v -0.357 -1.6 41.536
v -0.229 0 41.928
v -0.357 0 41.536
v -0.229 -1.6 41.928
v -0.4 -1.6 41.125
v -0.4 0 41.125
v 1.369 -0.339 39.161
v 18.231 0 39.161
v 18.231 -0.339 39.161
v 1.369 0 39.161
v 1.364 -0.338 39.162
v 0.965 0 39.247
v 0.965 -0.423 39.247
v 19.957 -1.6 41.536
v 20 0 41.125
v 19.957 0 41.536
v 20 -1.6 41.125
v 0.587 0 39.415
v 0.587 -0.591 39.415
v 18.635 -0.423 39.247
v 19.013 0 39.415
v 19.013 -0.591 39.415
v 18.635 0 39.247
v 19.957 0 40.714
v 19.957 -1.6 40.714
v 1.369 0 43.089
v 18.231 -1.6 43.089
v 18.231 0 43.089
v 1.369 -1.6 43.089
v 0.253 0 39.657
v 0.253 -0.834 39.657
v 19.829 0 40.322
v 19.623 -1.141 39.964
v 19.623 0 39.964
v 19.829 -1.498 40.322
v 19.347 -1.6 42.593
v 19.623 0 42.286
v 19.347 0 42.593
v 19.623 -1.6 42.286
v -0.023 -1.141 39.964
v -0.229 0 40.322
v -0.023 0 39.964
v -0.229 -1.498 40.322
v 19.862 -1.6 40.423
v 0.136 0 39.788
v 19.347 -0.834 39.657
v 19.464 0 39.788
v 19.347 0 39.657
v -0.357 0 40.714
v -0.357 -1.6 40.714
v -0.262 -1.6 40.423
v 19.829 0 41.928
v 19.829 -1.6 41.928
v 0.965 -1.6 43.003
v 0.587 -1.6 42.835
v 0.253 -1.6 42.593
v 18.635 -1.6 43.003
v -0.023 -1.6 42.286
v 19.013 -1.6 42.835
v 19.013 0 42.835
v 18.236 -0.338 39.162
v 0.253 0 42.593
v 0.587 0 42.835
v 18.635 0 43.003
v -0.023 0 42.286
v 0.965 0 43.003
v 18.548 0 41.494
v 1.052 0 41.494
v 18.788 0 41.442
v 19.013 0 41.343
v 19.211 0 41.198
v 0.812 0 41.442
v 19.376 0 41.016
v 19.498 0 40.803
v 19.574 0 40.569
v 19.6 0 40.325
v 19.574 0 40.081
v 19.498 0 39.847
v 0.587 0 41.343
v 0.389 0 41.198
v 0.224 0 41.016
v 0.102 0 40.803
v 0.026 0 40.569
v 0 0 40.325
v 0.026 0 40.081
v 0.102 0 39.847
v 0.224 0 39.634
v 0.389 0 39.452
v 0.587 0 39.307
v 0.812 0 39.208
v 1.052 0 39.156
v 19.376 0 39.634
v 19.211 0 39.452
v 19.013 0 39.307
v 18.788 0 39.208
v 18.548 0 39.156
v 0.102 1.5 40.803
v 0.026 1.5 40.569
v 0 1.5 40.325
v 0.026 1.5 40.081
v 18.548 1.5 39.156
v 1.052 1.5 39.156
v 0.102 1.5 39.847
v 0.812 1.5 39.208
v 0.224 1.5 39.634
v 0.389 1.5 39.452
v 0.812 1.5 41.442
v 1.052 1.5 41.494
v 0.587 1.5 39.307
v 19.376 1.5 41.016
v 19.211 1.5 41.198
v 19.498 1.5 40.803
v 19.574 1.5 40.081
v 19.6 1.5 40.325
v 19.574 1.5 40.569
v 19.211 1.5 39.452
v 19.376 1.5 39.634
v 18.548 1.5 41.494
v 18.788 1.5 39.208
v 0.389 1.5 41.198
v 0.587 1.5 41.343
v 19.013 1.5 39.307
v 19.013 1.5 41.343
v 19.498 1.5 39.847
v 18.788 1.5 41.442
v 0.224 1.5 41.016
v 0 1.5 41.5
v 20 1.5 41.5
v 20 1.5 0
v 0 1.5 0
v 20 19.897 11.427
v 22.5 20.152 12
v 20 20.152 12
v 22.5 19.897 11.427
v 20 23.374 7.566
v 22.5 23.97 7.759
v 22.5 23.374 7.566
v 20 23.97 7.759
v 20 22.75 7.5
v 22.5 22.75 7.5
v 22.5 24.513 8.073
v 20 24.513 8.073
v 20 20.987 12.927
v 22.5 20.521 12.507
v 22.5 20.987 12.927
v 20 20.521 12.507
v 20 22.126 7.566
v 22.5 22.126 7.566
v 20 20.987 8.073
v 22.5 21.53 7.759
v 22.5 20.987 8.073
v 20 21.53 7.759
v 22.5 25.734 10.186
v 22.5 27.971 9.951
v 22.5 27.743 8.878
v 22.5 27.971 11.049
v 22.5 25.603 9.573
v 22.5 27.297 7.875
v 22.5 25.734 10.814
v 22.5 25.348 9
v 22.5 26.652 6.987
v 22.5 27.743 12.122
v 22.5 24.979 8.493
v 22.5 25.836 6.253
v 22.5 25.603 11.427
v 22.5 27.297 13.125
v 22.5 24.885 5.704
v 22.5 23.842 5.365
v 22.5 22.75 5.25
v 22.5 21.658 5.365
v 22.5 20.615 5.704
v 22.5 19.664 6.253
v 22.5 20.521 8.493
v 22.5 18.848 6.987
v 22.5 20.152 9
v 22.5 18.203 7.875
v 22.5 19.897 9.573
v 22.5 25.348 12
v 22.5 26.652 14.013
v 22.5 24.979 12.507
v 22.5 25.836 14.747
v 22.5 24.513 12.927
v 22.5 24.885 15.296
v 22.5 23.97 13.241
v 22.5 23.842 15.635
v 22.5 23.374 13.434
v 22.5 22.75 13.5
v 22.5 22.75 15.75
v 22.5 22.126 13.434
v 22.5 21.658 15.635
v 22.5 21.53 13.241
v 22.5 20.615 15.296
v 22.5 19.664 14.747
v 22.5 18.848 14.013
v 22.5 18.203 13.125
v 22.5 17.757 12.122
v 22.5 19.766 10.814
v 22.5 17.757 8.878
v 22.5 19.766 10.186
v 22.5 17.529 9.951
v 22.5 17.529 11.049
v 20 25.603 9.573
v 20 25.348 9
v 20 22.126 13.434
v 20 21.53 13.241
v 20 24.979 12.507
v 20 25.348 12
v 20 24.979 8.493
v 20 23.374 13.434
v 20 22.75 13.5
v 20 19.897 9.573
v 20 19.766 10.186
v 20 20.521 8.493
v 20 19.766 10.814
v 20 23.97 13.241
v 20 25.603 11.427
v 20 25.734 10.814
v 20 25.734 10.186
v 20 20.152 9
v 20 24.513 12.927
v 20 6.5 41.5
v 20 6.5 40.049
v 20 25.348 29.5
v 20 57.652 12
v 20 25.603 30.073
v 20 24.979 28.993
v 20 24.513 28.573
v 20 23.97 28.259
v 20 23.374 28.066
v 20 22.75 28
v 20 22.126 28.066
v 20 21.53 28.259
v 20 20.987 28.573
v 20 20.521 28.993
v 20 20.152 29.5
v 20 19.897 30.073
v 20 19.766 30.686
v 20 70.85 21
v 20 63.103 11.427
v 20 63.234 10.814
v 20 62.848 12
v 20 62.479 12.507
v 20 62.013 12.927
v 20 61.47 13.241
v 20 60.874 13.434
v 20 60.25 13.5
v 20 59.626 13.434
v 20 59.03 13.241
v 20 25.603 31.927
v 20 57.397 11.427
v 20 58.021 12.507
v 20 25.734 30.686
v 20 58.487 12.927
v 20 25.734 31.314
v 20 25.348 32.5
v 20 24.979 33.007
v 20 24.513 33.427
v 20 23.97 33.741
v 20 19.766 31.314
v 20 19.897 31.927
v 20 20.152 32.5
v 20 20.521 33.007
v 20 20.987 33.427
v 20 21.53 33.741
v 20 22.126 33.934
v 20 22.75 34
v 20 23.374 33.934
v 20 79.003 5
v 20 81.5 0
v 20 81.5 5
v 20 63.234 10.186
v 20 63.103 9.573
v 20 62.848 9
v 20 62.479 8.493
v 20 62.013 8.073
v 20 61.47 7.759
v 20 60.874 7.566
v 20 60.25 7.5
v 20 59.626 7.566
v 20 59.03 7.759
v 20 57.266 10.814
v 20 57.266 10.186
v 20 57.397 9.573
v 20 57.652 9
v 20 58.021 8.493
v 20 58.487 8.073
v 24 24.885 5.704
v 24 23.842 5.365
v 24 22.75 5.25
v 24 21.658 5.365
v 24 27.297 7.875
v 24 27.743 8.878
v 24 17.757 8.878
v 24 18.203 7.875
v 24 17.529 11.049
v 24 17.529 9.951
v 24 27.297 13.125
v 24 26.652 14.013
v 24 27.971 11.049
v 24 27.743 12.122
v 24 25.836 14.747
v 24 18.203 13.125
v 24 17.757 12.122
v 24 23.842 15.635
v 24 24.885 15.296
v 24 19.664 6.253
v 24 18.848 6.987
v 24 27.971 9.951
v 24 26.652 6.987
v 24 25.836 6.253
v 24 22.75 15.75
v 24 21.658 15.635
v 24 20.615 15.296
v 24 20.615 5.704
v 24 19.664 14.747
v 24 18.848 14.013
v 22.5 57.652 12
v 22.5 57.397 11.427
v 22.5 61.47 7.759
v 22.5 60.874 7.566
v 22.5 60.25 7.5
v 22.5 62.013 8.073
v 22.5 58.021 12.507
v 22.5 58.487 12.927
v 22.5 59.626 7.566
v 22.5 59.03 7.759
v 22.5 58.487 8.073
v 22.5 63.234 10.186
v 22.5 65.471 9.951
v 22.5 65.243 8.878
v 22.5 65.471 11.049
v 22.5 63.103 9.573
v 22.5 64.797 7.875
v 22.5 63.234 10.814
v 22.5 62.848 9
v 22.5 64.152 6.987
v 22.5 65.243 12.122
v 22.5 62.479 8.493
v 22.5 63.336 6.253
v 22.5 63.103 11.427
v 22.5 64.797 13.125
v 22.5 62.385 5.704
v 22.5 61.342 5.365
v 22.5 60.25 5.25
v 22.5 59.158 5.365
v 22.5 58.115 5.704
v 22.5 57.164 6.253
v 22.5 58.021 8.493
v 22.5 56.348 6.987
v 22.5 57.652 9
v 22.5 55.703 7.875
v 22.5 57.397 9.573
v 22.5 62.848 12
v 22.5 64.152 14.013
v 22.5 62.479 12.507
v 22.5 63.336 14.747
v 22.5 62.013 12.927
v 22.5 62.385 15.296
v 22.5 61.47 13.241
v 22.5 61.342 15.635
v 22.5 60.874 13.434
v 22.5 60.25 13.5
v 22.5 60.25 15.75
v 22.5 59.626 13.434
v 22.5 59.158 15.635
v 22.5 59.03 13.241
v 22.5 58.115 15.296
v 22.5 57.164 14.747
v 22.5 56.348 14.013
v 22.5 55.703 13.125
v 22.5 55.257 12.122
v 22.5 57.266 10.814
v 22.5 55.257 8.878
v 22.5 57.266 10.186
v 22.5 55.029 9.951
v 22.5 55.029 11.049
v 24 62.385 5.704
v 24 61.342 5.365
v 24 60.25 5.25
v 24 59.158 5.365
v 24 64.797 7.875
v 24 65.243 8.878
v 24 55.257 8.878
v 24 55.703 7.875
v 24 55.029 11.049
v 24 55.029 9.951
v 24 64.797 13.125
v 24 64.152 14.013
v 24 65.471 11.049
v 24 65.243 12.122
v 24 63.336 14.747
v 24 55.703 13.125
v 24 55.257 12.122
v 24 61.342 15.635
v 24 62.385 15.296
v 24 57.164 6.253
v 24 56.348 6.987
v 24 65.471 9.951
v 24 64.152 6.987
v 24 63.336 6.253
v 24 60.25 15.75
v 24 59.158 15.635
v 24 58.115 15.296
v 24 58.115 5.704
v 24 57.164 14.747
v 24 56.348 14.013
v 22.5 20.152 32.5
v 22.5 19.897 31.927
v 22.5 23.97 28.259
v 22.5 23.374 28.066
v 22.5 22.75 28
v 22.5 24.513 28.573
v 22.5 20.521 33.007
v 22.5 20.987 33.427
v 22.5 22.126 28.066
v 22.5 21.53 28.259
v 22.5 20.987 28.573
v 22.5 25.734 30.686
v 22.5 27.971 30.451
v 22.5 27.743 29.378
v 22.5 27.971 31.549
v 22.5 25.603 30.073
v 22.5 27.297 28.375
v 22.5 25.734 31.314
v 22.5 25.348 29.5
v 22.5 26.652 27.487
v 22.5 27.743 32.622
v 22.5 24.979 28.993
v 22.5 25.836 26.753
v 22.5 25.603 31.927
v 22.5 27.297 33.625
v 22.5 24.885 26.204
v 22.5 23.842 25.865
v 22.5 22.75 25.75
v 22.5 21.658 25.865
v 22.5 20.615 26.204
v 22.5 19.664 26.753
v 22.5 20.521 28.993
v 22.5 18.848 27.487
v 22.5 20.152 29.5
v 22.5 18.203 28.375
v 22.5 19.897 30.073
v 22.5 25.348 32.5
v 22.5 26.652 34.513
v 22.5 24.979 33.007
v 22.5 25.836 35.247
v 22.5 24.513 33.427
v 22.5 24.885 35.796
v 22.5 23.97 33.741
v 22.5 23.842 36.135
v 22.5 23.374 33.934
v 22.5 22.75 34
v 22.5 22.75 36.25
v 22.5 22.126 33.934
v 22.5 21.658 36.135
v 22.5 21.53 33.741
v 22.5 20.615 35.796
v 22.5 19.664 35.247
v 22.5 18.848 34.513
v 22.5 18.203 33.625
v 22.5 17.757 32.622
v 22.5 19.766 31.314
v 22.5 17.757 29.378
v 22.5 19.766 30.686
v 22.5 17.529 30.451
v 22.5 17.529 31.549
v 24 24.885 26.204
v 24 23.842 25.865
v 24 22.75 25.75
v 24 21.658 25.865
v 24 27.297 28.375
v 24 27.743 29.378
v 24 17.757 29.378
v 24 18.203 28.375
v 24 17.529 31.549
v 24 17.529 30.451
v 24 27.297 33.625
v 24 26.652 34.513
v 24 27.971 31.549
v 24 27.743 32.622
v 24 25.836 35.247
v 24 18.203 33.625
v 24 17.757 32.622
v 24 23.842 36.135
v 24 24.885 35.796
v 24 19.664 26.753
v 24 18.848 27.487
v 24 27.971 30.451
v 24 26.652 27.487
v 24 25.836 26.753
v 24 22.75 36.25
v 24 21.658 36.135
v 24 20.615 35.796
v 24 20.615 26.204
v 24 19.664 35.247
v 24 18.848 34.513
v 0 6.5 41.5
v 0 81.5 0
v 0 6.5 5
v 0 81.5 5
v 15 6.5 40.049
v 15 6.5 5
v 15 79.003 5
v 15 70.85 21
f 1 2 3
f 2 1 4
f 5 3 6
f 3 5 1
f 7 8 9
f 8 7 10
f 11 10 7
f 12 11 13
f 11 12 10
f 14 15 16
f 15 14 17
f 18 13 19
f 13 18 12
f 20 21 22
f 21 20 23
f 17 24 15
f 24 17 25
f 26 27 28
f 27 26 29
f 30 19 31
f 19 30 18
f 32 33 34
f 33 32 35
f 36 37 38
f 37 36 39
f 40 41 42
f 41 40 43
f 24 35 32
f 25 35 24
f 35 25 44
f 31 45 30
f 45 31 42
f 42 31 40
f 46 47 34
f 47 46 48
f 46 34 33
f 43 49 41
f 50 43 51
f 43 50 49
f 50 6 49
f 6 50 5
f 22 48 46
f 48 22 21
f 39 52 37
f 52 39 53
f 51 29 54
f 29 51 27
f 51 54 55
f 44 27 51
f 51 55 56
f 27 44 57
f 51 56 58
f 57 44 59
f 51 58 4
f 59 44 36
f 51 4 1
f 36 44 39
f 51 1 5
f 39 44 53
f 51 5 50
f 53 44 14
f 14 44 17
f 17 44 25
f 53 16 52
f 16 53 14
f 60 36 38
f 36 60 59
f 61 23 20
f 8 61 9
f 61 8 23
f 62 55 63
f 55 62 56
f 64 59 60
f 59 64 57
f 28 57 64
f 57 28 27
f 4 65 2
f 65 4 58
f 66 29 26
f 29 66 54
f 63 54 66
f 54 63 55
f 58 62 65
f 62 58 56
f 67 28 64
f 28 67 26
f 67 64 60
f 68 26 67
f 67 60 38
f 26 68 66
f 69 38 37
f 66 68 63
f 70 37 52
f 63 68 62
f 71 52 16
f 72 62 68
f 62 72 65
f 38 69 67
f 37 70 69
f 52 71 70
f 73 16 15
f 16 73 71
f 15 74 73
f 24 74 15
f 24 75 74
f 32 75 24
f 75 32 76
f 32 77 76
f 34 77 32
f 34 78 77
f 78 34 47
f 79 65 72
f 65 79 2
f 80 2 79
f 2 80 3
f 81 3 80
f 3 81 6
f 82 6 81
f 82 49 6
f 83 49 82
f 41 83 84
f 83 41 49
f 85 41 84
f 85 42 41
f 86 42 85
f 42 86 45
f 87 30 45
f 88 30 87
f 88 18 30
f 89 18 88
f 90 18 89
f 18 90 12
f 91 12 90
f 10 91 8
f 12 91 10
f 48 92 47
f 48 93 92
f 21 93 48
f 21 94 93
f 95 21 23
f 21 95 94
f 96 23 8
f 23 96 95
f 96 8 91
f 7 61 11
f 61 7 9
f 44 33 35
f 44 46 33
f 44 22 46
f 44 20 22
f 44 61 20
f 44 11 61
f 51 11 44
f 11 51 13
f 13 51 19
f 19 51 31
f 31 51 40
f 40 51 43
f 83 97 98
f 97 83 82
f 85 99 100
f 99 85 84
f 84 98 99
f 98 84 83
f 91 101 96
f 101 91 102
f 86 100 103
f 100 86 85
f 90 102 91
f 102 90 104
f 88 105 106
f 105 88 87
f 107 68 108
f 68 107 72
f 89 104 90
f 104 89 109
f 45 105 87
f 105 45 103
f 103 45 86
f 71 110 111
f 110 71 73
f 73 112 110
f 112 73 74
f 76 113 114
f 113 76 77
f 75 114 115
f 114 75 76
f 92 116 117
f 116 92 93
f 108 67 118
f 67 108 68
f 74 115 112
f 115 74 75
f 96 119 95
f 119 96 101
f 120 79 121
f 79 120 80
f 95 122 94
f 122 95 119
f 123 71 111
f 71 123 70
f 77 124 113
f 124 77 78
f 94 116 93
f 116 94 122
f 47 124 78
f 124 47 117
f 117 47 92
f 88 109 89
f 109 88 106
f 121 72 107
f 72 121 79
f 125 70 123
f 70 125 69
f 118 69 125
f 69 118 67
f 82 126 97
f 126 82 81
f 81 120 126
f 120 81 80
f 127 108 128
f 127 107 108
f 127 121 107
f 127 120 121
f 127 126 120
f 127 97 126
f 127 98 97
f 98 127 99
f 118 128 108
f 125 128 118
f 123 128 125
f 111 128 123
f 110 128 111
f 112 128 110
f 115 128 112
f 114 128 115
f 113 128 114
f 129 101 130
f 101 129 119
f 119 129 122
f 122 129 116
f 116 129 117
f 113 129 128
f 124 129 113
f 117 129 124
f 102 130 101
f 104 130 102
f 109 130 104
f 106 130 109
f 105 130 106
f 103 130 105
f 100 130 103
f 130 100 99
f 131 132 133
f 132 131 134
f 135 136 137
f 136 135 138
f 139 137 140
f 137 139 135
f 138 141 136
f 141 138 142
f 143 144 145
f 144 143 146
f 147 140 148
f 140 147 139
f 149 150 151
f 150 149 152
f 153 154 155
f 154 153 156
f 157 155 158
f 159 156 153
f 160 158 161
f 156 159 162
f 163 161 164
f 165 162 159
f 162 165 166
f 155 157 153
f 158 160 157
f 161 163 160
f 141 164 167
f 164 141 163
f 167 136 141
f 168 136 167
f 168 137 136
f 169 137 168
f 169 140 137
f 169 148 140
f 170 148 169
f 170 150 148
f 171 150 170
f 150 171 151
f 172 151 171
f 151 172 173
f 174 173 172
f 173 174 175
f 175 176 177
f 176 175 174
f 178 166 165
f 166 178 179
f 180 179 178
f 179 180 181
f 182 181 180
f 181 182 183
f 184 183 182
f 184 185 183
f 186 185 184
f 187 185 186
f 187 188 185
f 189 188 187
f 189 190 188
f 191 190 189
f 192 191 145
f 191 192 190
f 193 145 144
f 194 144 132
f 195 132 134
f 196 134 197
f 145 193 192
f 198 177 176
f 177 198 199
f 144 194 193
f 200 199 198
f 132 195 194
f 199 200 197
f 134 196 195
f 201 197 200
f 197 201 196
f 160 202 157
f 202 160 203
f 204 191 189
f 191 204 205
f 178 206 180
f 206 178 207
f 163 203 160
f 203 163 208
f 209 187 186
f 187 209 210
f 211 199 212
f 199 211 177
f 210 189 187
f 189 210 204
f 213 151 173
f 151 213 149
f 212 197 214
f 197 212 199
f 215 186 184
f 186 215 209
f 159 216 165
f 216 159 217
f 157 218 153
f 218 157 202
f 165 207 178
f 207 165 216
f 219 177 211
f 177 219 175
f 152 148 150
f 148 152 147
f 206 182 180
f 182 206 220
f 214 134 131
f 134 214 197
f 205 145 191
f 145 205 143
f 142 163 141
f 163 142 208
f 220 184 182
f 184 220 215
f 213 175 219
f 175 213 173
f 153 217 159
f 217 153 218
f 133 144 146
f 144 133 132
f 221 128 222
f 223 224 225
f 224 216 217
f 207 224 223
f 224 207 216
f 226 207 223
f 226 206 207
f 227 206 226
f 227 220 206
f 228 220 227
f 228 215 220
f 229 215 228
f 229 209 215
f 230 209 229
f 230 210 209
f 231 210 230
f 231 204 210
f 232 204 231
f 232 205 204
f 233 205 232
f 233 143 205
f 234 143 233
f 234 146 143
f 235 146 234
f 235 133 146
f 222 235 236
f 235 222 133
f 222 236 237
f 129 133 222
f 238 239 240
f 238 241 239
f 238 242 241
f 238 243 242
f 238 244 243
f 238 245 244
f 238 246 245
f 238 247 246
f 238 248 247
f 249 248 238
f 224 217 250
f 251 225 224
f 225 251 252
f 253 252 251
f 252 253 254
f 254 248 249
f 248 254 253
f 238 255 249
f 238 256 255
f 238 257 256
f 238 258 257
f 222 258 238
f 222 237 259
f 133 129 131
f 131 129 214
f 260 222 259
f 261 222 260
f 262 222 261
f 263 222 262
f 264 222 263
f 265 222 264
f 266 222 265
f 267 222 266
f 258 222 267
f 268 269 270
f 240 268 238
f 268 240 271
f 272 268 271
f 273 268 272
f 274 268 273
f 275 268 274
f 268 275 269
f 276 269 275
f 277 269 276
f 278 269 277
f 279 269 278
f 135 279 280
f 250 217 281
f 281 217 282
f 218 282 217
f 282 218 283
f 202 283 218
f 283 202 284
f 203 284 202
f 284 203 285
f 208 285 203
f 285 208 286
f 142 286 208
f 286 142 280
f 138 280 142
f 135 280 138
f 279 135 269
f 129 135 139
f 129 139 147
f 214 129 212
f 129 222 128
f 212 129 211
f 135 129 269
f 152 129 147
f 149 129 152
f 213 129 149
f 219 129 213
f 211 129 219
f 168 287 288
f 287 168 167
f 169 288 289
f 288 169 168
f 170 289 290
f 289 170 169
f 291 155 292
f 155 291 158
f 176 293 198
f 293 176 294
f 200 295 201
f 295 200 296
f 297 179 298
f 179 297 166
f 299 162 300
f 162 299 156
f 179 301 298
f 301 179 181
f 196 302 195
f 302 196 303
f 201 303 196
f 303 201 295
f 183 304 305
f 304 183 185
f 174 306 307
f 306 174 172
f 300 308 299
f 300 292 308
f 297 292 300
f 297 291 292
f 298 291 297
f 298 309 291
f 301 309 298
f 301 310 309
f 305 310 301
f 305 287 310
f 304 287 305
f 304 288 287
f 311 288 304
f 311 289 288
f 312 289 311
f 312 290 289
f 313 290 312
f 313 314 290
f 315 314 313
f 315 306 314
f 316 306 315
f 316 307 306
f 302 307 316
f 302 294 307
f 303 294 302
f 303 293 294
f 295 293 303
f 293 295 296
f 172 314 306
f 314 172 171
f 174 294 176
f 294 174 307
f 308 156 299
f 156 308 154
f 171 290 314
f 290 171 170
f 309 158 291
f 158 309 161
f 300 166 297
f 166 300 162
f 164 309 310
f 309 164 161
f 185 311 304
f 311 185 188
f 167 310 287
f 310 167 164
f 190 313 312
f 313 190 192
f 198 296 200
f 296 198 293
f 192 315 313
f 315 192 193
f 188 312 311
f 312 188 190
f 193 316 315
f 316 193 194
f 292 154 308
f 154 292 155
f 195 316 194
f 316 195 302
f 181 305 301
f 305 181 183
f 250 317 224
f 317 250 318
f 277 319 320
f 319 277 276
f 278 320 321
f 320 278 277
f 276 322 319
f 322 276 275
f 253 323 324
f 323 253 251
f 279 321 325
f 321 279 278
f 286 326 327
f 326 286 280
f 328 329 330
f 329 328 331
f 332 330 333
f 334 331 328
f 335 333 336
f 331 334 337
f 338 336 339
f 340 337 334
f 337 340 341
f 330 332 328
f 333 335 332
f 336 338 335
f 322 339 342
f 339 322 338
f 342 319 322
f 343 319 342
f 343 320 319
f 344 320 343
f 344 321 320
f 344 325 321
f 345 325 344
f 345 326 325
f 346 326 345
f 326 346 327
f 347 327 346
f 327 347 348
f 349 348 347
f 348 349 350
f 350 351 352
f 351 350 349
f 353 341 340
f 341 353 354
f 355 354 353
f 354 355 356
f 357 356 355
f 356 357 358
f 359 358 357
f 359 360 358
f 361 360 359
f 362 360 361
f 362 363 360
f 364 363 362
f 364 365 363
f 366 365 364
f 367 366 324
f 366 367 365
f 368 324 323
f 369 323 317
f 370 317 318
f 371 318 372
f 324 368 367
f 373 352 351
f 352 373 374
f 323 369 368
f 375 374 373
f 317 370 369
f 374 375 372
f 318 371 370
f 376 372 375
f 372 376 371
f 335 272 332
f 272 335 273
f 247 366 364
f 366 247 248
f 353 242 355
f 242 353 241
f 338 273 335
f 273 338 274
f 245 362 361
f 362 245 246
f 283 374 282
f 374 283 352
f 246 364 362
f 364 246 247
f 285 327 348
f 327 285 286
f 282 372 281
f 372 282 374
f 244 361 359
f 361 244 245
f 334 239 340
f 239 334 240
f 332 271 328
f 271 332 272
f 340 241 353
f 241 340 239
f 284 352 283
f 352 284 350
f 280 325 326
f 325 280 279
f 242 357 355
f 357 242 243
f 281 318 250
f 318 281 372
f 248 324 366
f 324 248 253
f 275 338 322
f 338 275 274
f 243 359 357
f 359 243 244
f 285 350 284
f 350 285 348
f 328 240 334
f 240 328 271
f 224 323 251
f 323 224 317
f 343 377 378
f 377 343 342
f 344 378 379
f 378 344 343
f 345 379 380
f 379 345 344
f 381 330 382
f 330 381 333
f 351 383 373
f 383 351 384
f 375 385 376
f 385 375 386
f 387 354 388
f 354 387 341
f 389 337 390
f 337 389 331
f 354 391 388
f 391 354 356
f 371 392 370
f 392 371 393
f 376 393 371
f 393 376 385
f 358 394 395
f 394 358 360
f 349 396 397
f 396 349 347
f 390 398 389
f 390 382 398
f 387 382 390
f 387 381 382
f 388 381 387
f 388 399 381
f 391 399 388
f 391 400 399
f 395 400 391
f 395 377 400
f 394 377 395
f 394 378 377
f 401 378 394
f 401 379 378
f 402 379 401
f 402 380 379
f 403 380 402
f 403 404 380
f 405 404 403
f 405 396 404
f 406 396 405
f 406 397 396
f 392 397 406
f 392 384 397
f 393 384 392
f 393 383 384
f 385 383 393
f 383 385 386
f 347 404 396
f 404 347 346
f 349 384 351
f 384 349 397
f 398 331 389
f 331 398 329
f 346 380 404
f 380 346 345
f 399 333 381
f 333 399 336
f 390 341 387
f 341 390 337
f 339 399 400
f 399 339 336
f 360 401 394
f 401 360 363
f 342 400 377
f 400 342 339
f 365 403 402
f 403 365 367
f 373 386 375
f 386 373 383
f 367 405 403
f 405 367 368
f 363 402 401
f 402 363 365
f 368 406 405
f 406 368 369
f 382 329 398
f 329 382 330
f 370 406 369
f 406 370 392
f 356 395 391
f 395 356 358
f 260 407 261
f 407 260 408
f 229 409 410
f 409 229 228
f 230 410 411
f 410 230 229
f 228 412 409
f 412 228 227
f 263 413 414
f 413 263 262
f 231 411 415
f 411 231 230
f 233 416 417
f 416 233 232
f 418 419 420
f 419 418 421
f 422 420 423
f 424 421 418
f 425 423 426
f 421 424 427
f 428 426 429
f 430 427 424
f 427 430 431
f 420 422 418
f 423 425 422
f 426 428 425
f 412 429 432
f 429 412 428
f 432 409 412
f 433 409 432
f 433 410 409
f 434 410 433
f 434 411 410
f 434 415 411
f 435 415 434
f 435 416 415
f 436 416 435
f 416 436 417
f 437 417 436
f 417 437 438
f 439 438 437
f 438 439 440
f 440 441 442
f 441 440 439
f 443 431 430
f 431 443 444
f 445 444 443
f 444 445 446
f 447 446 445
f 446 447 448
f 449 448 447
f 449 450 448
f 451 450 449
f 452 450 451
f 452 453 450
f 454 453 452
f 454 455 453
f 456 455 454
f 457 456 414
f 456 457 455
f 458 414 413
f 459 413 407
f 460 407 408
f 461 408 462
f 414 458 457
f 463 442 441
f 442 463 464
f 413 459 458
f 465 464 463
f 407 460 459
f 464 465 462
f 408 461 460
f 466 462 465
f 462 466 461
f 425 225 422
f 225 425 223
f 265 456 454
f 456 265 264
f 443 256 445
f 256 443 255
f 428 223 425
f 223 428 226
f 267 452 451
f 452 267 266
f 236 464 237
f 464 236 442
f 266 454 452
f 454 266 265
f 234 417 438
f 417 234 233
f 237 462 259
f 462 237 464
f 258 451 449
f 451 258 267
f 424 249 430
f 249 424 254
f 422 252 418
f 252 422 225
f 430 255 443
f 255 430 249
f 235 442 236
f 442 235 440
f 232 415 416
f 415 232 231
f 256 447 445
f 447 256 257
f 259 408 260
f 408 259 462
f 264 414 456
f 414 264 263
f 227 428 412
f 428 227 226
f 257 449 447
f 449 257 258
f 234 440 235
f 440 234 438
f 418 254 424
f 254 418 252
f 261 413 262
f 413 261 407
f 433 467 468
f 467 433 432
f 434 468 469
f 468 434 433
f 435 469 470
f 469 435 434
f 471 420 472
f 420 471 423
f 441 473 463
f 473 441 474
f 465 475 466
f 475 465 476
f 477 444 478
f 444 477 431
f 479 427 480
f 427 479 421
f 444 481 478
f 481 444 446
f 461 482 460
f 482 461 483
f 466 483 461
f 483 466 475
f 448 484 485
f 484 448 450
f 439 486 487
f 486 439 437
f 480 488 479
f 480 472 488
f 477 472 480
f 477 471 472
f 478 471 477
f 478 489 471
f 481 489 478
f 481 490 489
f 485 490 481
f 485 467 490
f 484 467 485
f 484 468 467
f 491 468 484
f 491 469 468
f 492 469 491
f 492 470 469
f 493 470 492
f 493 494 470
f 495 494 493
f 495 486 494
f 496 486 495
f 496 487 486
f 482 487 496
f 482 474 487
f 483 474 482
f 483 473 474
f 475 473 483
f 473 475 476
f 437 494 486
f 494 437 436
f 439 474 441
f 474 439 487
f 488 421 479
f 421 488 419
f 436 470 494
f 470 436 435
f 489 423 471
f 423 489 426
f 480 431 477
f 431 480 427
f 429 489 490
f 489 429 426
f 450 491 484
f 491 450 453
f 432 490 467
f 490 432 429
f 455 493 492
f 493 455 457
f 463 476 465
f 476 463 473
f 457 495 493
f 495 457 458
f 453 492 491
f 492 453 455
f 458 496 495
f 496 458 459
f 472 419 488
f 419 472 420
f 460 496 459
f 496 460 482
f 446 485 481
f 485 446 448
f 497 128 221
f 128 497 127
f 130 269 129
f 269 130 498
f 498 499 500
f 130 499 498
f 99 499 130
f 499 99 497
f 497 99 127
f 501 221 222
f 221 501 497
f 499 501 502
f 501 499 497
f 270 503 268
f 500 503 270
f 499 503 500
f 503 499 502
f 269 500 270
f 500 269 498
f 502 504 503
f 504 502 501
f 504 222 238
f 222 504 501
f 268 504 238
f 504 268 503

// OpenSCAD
// Rack Sovol Display Mount
// Single post clips into vented rack faceplate,
// Sovol display bracket mounts via keyhole slots on its left side
//
// Faceplate vertical (XZ plane) at Y=0
// Post extends into rack (+Y)
// Sovol bracket's left side faces +X, slides up (+Z) to lock onto pegs

$fn = 30;

/* [Faceplate Slots] */
slot_w = 20;
slot_h = 2.75;
panel_t = 1.5;
gap_x = 6.4;
gap_y = 3.45;
clearance = 0.2;
tab_barb = 0.4;

/* [Sovol Keyhole Mounts] */
kh_large = 11;          // large circle diameter
kh_small = 6.5;         // small circle diameter
kh_lower_gap = 37.5;    // between lower two keyholes (Y axis on post)
kh_upper_rise = 20.5;   // upper keyhole above lower pair (Z axis)
sovol_wall_t = 2;       // sovol bracket side wall thickness

/* [Mount Parameters] */
wall = 5;
post_depth = 80;        // post extends this far into rack (Y)
post_width = 20;        // post width (X), matches tab_w

/* [Derived] */
tab_w = slot_w - clearance * 2;
tab_h = slot_h - clearance * 2;

peg_shaft_d = kh_small - 0.5;
peg_head_d = kh_large - 0.5;
peg_head_t = 1.5;
peg_shaft_l = sovol_wall_t + 0.5;

// Post height: enough to cover keyhole pattern + walls
post_height = kh_upper_rise + kh_large / 2 + wall * 2;

// Keyhole peg Y positions on post (lower pair + upper)
kh_y_start = (post_depth - kh_lower_gap) / 2;

module pill_2d(w, h) {
    r = h / 2;
    hull() {
        translate([r, r]) circle(r=r);
        translate([w - r, r]) circle(r=r);
    }
}

// Tab (same as rack-display-mount.scad)
module tab() {
    difference() {
        translate([-(tab_barb), -1.6, (tab_barb * 4)])
            rotate([-90, 0, 0])
                linear_extrude(1.6)
                    pill_2d(tab_w + tab_barb * 2, tab_h + tab_barb * 4);
        translate([-(tab_w / 2), -2, -4])
            rotate([45, 0, 0])
                cube([tab_w * 2, tab_h, 2]);
    }
    rotate([-90, 0, 0])
        linear_extrude(panel_t)
            pill_2d(tab_w, tab_h);
}

// Keyhole peg: shaft through bracket wall, head at tip retains bracket
module keyhole_peg() {
    // Shaft (goes through sovol bracket wall)
    cylinder(d=peg_shaft_d, h=peg_shaft_l);
    // Head at tip (catches outside of bracket wall)
    translate([0, 0, peg_shaft_l])
        cylinder(d=peg_head_d, h=peg_head_t);
}

module post() {
    // --- Spine against faceplate ---
    peg_margin_spine = kh_large / 2 + 5;
    spine_height = kh_large / 2 + wall + kh_upper_rise + peg_margin_spine;
    translate([0, panel_t, 0])
        cube([post_width, wall, spine_height]);

    // --- Tab into faceplate slot ---
    translate([0, 0, spine_height])
        tab();

    // --- Horizontal post into rack ---
    translate([0, panel_t, 0])
        cube([post_width, post_depth, wall]);

    // --- Angled side wall (+X face) follows peg line ---
    peg_margin = kh_large / 2 + 5;
    upper_z = kh_large / 2 + wall + kh_upper_rise + peg_margin;
    lower_rear_y = kh_y_start + kh_lower_gap + peg_margin;
    lower_rear_z = kh_large / 2 + wall + peg_margin;

    translate([post_width - wall, panel_t, 0])
        hull() {
            cube([wall, post_depth, 0.1]);              // bottom full depth
            cube([wall, 0.1, upper_z]);                 // front full height
            translate([0, lower_rear_y, 0])
                cube([wall, 0.1, lower_rear_z]);        // rear peg height
        }

    // --- Keyhole pegs on +X face ---
    // Pegs stick out in +X from post's right face
    // On the YZ face: Y = depth into rack, Z = height
    // Sovol bracket slides +Z to lock (large hole at bottom of each keyhole)

    // Lower front peg
    translate([post_width, panel_t + kh_y_start, kh_large / 2 + wall])
        rotate([0, 90, 0])
            keyhole_peg();

    // Lower rear peg
    translate([post_width, panel_t + kh_y_start + kh_lower_gap, kh_large / 2 + wall])
        rotate([0, 90, 0])
            keyhole_peg();

    // Upper peg (same Y as lower front)
    translate([post_width, panel_t + kh_y_start, kh_large / 2 + wall + kh_upper_rise])
        rotate([0, 90, 0])
            keyhole_peg();
}

post();

// Reference: Sovol bracket footprint (transparent)
%translate([
    post_width + peg_head_t + sovol_wall_t,
    panel_t + (post_depth - 102) / 2,
    0
])
    cube([121.25, 102, post_height]);
